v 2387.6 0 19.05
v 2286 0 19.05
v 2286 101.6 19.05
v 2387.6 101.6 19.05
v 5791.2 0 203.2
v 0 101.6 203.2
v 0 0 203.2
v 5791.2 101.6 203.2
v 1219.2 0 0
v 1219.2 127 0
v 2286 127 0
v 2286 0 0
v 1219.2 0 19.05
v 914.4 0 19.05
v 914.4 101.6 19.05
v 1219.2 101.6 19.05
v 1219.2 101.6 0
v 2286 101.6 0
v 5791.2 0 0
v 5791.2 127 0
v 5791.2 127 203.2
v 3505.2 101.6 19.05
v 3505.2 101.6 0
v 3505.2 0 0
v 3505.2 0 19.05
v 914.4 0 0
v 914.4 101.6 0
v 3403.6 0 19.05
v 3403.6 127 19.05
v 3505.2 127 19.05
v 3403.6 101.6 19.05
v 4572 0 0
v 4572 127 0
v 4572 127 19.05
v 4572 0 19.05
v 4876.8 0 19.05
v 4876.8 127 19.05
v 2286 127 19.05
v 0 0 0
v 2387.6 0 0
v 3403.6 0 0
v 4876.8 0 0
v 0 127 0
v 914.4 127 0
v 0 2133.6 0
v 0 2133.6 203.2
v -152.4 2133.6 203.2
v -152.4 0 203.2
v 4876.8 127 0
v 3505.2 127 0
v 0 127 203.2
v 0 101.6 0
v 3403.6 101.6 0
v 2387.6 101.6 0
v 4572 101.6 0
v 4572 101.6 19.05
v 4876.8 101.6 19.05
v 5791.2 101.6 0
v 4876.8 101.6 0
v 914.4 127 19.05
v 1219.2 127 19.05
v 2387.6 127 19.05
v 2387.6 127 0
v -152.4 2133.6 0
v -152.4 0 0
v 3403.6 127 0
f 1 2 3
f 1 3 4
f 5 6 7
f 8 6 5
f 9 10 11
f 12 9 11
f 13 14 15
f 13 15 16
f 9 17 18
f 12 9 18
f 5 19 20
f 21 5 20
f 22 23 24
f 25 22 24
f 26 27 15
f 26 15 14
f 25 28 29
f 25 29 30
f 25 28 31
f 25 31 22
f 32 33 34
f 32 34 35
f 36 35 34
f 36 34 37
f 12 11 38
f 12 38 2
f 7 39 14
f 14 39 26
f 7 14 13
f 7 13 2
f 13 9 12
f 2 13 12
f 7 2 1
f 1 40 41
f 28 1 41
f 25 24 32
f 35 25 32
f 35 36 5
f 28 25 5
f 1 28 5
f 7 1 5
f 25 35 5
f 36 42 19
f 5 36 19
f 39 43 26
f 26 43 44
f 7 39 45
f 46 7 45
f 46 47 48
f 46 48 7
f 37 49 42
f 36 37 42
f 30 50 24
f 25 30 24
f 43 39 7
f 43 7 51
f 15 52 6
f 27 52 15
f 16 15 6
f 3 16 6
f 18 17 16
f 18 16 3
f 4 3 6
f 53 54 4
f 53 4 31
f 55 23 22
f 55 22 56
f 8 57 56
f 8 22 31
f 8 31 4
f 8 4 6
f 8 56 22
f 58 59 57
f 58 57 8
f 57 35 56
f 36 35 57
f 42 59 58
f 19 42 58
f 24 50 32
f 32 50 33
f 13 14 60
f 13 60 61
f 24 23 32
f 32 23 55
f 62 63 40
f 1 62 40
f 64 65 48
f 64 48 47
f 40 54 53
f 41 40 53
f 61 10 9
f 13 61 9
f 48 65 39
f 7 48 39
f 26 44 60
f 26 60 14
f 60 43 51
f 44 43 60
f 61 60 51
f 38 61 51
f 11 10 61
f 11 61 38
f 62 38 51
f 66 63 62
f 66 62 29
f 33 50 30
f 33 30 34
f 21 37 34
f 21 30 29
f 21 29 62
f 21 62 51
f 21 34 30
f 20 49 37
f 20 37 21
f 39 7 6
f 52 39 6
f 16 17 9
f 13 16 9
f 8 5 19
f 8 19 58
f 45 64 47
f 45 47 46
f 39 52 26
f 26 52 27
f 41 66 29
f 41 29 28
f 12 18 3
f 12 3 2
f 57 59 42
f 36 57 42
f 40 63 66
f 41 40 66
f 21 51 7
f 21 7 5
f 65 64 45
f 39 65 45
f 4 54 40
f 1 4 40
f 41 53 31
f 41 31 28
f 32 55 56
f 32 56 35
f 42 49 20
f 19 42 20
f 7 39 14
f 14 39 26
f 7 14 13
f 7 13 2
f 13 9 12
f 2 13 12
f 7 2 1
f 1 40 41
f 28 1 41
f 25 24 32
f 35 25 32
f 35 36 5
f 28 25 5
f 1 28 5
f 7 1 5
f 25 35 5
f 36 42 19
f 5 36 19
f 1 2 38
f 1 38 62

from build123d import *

# Parameters (mm, degrees)
F0_W     = 5791.2
F0_H     = 127
F1_DEPTH = 203.2
F2_W     = 304.8
F2_H     = 127
F2_W_2   = 101.6
F3_DEPTH = 19.05
F4_W     = 5791.2
F4_H     = 101.6
F5_DEPTH = 203.2
F6_DEPTH = 19.05
F7_W     = 152.4
F7_H     = 2133.6
F8_DEPTH = 203.2


with BuildPart() as f1:
    # F0 (on Top) → F1 (new body)
    with BuildSketch(Plane.XY):
        with Locations((2895.6, 63.5)):
            Rectangle(F0_W, F0_H)
    extrude(amount=F1_DEPTH)

    # F2 (on face) → F3 (cut)
    with BuildSketch(Plane(origin=(0, 0, 0), x_dir=(1, 0, 0), z_dir=(0, 0, -1))):
        with Locations((1066.8, -63.5)):
            Rectangle(F2_W, F2_H)
        with Locations((2336.8, -63.5)):
            Rectangle(F2_W_2, F2_H)
        with Locations((3454.4, -63.5)):
            Rectangle(F2_W_2, F2_H)
        with Locations((4724.4, -63.5)):
            Rectangle(F2_W, F2_H)
    extrude(amount=-F3_DEPTH, mode=Mode.SUBTRACT)


with BuildPart() as f5:
    # F4 (on Top) → F5 (new body)
    with BuildSketch(Plane.XY):
        with Locations((2895.6, 50.8)):
            Rectangle(F4_W, F4_H)
    extrude(amount=F5_DEPTH)

    # F2 (on face) → F6 (cut)
    with BuildSketch(Plane(origin=(0, 0, 0), x_dir=(1, 0, 0), z_dir=(0, 0, -1))):
        with Locations((1066.8, -63.5)):
            Rectangle(F2_W, F2_H)
        with Locations((2336.8, -63.5)):
            Rectangle(F2_W_2, F2_H)
        with Locations((3454.4, -63.5)):
            Rectangle(F2_W_2, F2_H)
        with Locations((4724.4, -63.5)):
            Rectangle(F2_W, F2_H)
    extrude(amount=-F6_DEPTH, mode=Mode.SUBTRACT)


with BuildPart() as f8:
    # F7 (on Top) → F8 (new body)
    with BuildSketch(Plane.XY):
        with Locations((-76.2, 1066.8)):
            Rectangle(F7_W, F7_H)
    extrude(amount=F8_DEPTH)


solid = Compound([f1.part, f5.part, f8.part])
